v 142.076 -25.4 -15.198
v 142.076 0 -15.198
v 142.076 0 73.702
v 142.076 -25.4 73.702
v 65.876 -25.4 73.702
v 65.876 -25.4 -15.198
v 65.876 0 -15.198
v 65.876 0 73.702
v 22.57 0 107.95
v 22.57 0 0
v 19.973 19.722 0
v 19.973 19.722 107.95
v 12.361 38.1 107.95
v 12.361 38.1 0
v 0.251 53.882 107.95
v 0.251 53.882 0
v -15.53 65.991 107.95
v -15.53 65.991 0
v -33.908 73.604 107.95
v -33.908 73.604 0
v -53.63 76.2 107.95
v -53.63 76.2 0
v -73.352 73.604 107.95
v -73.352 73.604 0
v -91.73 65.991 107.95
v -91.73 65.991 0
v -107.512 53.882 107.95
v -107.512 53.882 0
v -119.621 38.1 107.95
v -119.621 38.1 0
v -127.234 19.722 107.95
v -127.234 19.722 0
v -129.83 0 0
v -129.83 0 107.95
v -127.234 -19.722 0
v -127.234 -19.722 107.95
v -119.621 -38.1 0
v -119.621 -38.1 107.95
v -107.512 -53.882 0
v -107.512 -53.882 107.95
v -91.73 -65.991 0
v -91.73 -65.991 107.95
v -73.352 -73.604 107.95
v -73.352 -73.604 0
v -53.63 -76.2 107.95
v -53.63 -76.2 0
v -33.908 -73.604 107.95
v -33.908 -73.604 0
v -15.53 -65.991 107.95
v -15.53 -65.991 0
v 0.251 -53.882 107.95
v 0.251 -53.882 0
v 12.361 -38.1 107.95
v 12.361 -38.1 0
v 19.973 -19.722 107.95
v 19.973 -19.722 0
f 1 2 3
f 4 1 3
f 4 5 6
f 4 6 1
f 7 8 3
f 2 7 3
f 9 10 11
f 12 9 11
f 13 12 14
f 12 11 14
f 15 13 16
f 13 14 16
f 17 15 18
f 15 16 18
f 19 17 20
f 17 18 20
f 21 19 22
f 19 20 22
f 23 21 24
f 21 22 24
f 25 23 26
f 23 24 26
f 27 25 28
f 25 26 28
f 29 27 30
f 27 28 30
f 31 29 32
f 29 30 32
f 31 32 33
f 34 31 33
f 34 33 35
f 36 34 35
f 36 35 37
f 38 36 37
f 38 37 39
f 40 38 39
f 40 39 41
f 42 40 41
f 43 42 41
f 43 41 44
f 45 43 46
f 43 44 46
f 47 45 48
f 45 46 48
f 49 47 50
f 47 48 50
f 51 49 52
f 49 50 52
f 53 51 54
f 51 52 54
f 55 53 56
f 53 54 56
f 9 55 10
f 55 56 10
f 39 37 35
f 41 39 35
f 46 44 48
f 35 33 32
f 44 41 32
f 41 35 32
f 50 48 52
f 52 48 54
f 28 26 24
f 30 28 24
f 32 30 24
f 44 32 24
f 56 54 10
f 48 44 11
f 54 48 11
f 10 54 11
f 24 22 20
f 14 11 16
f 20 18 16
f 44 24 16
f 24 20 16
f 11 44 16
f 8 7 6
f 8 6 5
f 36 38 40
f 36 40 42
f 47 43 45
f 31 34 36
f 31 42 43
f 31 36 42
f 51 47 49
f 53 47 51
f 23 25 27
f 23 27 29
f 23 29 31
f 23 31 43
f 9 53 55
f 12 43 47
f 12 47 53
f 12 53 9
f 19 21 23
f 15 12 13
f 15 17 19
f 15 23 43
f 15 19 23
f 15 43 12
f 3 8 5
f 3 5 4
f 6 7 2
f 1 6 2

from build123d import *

# Parameters (mm, degrees)
F0_R     = 38.5205832367
F1_DEPTH = 107.95
F3_R     = 76.2
F4_DEPTH = 107.95
F5_W     = 76.2
F5_H     = 88.9
F6_DEPTH = 25.4


with BuildPart() as f1:
    # F0 (on Top) → F1 (new body)
    with BuildSketch(Plane.XY):
        with Locations((-23.3390182257, 8.7591558695)):
            Circle(F0_R)
    extrude(amount=F1_DEPTH)


with BuildPart() as f4:
    # F3 (on Top) → F4 (new body)
    with BuildSketch(Plane.XY):
        with Locations((-53.6301706501, 0)):
            Circle(F3_R)
    extrude(amount=F4_DEPTH)


with BuildPart() as f6:
    # F5 (on Front) → F6 (new body)
    with BuildSketch(Plane.XZ):
        with Locations((103.9764787052, 29.2519489303)):
            Rectangle(F5_W, F5_H)
    extrude(amount=F6_DEPTH)


solid = Compound([f4.part, f6.part])
